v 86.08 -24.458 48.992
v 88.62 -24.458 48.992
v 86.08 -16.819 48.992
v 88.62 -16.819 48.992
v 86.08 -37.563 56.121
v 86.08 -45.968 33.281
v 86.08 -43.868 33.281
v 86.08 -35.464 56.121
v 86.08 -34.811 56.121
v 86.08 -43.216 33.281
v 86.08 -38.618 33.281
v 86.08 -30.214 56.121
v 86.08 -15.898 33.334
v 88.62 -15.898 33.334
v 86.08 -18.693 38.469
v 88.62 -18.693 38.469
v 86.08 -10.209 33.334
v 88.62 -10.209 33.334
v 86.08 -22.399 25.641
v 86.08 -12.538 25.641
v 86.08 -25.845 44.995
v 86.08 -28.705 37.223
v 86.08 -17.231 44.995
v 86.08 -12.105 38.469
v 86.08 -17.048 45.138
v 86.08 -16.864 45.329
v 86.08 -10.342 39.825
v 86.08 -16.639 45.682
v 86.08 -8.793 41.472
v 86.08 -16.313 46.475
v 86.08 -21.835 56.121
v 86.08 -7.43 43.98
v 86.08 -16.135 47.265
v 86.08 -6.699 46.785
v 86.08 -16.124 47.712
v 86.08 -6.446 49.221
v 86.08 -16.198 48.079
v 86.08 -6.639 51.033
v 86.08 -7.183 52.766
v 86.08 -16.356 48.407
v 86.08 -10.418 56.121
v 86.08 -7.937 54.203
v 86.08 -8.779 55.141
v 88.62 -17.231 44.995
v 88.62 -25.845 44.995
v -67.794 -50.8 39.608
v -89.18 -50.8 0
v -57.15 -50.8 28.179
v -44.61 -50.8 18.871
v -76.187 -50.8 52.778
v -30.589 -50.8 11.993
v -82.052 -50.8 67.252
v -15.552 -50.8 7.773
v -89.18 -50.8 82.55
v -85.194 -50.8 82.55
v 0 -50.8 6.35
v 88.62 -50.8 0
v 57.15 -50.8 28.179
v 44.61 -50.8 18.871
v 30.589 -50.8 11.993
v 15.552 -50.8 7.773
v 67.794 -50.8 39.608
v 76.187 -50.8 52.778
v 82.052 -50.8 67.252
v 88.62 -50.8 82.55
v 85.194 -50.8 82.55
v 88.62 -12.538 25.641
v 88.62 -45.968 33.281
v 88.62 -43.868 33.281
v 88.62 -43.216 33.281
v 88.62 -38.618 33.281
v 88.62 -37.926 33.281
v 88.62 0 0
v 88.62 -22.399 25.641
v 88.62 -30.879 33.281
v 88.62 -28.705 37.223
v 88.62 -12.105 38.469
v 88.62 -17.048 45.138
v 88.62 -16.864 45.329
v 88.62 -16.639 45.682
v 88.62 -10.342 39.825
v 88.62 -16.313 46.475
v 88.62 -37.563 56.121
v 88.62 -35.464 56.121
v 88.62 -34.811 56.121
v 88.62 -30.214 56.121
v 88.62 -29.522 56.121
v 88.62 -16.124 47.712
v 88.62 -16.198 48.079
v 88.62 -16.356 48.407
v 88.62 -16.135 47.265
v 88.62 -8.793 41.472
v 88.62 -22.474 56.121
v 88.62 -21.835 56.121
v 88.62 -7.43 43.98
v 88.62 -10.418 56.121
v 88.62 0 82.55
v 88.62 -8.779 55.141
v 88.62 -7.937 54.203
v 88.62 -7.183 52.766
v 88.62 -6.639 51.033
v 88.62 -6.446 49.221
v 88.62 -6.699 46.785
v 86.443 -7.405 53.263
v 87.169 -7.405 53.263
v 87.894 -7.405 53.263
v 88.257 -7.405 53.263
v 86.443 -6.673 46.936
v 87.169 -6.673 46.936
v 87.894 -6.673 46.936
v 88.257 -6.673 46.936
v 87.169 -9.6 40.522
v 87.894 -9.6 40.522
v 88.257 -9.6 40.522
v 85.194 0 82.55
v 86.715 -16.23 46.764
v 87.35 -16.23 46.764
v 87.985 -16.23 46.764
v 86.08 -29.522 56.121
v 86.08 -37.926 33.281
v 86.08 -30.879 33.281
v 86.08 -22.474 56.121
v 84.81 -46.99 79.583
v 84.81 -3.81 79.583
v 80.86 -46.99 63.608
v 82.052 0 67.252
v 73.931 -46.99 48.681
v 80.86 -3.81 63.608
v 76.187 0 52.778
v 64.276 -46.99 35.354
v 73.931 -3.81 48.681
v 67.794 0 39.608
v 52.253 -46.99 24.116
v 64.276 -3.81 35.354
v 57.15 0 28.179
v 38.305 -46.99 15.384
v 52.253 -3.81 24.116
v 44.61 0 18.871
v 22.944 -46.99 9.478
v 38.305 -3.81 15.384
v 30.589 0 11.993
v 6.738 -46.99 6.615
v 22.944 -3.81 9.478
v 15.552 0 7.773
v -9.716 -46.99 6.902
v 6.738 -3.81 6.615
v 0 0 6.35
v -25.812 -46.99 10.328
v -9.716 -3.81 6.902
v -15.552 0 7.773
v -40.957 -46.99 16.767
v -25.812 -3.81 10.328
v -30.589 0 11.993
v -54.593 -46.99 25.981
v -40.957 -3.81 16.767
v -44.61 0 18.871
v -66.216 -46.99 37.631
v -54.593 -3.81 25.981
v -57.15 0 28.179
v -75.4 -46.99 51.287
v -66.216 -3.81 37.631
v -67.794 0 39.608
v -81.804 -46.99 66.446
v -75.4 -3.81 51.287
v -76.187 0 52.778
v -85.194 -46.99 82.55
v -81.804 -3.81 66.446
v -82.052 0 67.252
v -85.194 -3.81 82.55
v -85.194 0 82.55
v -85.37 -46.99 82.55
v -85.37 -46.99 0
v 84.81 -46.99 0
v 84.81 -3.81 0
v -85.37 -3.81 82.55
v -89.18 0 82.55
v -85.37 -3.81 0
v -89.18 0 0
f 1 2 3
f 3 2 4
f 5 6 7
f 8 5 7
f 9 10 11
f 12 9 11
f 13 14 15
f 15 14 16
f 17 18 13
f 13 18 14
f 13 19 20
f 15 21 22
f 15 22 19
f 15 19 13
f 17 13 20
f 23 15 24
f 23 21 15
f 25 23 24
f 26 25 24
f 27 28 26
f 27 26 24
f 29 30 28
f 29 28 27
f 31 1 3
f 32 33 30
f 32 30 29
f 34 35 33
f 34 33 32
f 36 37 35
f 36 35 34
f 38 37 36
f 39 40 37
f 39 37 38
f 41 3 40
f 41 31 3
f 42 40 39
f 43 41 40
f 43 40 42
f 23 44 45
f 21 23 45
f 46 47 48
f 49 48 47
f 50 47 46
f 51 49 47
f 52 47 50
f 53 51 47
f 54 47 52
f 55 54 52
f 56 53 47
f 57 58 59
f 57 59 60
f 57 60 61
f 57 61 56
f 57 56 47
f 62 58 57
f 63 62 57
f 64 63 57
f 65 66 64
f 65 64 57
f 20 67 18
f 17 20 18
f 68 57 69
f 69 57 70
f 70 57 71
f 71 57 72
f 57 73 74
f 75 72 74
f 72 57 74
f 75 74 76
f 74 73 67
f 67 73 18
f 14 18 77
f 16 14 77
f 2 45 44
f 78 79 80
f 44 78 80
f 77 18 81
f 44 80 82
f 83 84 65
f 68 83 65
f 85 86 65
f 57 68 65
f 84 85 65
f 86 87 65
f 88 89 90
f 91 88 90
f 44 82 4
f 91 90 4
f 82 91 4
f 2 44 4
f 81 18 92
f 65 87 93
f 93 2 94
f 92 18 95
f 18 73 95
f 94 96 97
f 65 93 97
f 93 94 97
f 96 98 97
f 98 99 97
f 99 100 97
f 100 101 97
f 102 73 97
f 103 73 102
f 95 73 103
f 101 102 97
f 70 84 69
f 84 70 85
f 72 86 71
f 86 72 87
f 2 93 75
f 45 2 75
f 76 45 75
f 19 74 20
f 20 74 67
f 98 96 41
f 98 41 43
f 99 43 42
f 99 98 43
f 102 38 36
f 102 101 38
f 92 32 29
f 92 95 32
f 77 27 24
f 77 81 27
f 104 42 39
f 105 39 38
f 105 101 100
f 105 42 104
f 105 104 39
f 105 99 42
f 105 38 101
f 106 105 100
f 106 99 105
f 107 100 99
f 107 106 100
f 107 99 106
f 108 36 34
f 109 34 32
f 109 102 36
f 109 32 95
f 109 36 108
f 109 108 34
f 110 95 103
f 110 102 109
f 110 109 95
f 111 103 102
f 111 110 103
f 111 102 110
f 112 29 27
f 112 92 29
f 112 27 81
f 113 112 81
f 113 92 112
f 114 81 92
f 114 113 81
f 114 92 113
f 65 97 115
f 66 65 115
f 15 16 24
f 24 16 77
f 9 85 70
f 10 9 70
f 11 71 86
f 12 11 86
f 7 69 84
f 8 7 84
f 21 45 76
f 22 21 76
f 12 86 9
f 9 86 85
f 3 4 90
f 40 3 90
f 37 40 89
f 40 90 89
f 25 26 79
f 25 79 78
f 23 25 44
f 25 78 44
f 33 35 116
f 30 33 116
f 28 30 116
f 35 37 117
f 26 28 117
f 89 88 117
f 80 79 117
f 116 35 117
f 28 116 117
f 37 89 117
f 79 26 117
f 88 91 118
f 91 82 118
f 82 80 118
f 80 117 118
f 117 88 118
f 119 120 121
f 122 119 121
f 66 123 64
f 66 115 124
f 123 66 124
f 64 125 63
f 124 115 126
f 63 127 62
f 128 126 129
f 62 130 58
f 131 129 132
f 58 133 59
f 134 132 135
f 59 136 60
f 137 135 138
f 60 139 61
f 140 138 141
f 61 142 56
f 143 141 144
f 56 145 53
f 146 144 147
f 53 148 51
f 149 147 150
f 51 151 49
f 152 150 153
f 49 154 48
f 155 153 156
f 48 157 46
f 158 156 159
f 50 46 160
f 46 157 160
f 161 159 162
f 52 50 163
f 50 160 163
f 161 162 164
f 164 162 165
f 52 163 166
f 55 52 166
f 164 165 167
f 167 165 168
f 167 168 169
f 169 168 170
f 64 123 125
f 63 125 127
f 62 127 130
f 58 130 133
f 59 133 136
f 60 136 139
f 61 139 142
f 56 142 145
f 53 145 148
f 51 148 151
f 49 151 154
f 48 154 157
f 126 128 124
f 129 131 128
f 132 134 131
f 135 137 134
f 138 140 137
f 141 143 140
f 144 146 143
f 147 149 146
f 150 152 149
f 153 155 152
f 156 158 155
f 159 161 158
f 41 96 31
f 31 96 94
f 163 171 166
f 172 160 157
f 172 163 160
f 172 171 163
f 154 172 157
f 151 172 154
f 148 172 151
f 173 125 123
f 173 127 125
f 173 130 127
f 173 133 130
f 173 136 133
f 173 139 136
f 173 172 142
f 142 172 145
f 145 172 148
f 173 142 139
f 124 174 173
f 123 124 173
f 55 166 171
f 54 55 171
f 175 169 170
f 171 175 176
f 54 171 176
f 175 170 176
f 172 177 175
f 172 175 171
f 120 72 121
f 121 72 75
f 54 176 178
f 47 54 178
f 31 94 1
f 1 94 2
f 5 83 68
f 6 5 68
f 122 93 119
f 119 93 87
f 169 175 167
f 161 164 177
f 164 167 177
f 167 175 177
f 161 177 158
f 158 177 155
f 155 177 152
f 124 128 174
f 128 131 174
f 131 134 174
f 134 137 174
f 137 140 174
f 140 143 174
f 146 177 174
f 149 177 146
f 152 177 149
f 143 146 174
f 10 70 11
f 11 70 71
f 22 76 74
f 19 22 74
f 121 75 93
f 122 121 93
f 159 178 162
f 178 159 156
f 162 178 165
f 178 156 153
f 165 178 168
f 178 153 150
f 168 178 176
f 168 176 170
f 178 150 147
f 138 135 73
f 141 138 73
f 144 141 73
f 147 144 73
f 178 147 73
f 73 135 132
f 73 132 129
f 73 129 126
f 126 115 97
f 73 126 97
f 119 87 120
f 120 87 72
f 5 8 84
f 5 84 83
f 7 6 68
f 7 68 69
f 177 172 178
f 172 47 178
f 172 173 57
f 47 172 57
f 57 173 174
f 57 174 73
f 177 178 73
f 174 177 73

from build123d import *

# Parameters (mm, degrees)
F1_DEPTH = 50.8
F3_DEPTH = 2.54
F4_W     = 170.18
F4_H     = 43.18
F5_DEPTH = 82.5510001


with BuildPart() as f1:
    # F0 (on Front) → F1 (new body)
    with BuildSketch(Plane.XZ):
        with BuildLine():
            Line((-89.1799991712, 82.55), (-89.1799991712, 0))
            Line((-89.1799991712, 0), (88.6200008288, 0))
            Line((88.6200008288, 0), (88.6200008288, 82.55))
            Line((88.6200008288, 82.55), (85.1941899427, 82.55))
            ThreePointArc((85.1941899427, 82.55), (0, 6.35), (-85.1941899427, 82.55))
            Line((-85.1941899427, 82.55), (-89.1799991712, 82.55))
        make_face()
    extrude(amount=F1_DEPTH)

    # F2 (on face) → F3 (cut)
    with BuildSketch(Plane.YZ.offset(88.6200008288)):
        Polygon((-37.5634527076, 56.1206514695), (-45.9675195587, 33.2813703549), (-43.8684808629, 33.2813703549), (-35.4644140118, 56.1206514695), align=None)
        Polygon((-37.9258376017, 33.2813703549), (-30.8785599801, 33.2813703549), (-22.4744931291, 56.1206514695), (-29.5217707507, 56.1206514695), align=None)
        Polygon((-34.8114763209, 56.1206514695), (-43.215543172, 33.2813703549), (-38.6183339685, 33.2813703549), (-30.2142671174, 56.1206514695), align=None)
        with BuildLine():
            Line((-21.8350046216, 56.1206514695), (-24.458008221, 48.992255464))
            Line((-24.458008221, 48.992255464), (-16.8186221192, 48.992255464))
            add(Edge.make_bspline(
                [(-16.8186221192, 48.992255464), (-16.5650688194, 48.7058519581), (-16.0364420635, 48.1087366521), (-16.1460089371, 46.764492626), (-16.7359200401, 45.358777375), (-17.0941465697, 45.0955807852), (-17.2307778252, 44.9951949189)],
                knots=[0, 0, 0, 0, 0.2524611124, 0.5263496824, 0.8193449335, 1, 1, 1, 1], degree=3))
            Line((-17.2307778252, 44.9951949189), (-25.8454084249, 44.9951949189))
            Line((-25.8454084249, 44.9951949189), (-28.7053373028, 37.2229198086))
            Line((-28.7053373028, 37.2229198086), (-22.3991661055, 25.6406514695))
            Line((-22.3991661055, 25.6406514695), (-12.5383959732, 25.6406514695))
            Line((-12.5383959732, 25.6406514695), (-10.2086553273, 33.3342202489))
            Line((-10.2086553273, 33.3342202489), (-15.8975594249, 33.3342202489))
            Line((-15.8975594249, 33.3342202489), (-18.6933472439, 38.4691212412))
            Line((-18.6933472439, 38.4691212412), (-12.1049555279, 38.4691212412))
            add(Edge.make_bspline(
                [(-10.4178804995, 56.1206514695), (-9.8079992001, 55.81468124), (-8.5579503395, 55.1875465219), (-7.2723425667, 53.2835881675), (-6.2681571478, 50.1731018561), (-6.5962499881, 46.920709582), (-7.4565458058, 43.3248722799), (-9.4576902901, 40.390709487), (-11.2329073266, 39.1021207418), (-12.1049555279, 38.4691212412)],
                knots=[0, 0, 0, 0, 0.1175129286, 0.2408614638, 0.3885970952, 0.5383784175, 0.6968239202, 0.8510693906, 1, 1, 1, 1], degree=3))
            Line((-10.4178804995, 56.1206514695), (-21.8350046216, 56.1206514695))
        make_face()
    extrude(amount=-F3_DEPTH, mode=Mode.SUBTRACT)

    # F4 (on face) → F5 (cut, through all)
    with BuildSketch(Plane(origin=(0, 0, 0), x_dir=(1, 0, 0), z_dir=(0, 0, -1))):
        with Locations((-0.2799991712, 25.4)):
            Rectangle(F4_W, F4_H)
    extrude(amount=-F5_DEPTH, mode=Mode.SUBTRACT)


solid = f1.part
